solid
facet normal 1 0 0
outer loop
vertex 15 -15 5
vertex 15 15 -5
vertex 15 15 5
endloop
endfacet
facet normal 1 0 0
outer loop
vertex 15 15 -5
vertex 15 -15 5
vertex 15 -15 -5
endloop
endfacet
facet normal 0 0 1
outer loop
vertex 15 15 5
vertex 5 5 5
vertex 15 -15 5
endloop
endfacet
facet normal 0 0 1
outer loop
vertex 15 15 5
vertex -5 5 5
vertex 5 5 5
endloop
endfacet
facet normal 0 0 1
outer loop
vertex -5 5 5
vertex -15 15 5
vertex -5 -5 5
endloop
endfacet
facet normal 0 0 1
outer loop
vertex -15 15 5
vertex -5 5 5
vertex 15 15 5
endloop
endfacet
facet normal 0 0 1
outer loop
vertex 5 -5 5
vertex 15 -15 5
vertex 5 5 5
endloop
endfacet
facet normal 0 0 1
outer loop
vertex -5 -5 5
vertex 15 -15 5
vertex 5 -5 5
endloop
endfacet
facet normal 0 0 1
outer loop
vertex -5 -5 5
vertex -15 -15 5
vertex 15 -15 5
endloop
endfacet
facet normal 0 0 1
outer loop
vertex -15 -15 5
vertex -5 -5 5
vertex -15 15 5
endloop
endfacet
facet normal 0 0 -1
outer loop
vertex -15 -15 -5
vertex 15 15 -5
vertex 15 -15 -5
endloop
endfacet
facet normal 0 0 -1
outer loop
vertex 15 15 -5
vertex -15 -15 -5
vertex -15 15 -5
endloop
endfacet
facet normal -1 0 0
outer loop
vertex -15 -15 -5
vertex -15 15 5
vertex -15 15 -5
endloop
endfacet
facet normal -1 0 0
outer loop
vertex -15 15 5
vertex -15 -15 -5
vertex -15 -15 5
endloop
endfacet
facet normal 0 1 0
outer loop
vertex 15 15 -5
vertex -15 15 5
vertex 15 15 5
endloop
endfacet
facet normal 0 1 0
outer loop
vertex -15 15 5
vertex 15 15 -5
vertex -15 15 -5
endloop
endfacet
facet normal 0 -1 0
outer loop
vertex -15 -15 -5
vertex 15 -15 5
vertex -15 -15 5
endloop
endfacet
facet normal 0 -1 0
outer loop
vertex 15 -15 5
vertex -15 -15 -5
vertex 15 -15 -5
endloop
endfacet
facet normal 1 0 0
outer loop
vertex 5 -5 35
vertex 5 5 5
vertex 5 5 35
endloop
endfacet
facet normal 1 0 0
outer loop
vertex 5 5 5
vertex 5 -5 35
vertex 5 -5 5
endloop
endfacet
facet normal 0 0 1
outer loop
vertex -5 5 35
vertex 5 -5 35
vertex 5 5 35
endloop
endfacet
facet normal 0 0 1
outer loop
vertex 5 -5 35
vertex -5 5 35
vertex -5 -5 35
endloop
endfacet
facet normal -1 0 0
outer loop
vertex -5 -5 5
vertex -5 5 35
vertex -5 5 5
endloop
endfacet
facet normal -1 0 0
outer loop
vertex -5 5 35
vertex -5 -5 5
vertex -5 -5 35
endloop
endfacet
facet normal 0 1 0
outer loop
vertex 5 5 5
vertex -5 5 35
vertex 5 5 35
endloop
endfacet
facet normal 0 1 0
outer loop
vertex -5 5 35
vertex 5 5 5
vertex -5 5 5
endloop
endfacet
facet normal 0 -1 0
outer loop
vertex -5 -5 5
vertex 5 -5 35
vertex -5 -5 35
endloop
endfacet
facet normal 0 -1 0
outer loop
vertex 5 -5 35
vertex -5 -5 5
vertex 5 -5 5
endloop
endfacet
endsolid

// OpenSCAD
//-- Definiciones para acceder a las componentes X,Y,Z
//-- Aunque las definimos todas, en este ejemplo solo
//-- accedemos a la componente Z de los cubos
X = 0;
Y = 1;
Z = 2;


//-- Dimensiones de los cubos. Se pueden cambiar por el usuario
//-- Todo se recalculara para que B esté siempre encima de A
A = [30, 30, 10];
B = [10, 10, 30];

//-- Calcular la posicion de B para que este encima de A
posB = [0, 0, B[Z]/2 + A[Z]/2];


//---- Construccion de la figura a partir de los datos calculados!
//-- Poner el cubo B encima del A

//-- Poner el cubo A (es la base)
cube(A, center = true);

//-- Cubo B, encima de A
translate(posB)
  cube(B, center = true);
